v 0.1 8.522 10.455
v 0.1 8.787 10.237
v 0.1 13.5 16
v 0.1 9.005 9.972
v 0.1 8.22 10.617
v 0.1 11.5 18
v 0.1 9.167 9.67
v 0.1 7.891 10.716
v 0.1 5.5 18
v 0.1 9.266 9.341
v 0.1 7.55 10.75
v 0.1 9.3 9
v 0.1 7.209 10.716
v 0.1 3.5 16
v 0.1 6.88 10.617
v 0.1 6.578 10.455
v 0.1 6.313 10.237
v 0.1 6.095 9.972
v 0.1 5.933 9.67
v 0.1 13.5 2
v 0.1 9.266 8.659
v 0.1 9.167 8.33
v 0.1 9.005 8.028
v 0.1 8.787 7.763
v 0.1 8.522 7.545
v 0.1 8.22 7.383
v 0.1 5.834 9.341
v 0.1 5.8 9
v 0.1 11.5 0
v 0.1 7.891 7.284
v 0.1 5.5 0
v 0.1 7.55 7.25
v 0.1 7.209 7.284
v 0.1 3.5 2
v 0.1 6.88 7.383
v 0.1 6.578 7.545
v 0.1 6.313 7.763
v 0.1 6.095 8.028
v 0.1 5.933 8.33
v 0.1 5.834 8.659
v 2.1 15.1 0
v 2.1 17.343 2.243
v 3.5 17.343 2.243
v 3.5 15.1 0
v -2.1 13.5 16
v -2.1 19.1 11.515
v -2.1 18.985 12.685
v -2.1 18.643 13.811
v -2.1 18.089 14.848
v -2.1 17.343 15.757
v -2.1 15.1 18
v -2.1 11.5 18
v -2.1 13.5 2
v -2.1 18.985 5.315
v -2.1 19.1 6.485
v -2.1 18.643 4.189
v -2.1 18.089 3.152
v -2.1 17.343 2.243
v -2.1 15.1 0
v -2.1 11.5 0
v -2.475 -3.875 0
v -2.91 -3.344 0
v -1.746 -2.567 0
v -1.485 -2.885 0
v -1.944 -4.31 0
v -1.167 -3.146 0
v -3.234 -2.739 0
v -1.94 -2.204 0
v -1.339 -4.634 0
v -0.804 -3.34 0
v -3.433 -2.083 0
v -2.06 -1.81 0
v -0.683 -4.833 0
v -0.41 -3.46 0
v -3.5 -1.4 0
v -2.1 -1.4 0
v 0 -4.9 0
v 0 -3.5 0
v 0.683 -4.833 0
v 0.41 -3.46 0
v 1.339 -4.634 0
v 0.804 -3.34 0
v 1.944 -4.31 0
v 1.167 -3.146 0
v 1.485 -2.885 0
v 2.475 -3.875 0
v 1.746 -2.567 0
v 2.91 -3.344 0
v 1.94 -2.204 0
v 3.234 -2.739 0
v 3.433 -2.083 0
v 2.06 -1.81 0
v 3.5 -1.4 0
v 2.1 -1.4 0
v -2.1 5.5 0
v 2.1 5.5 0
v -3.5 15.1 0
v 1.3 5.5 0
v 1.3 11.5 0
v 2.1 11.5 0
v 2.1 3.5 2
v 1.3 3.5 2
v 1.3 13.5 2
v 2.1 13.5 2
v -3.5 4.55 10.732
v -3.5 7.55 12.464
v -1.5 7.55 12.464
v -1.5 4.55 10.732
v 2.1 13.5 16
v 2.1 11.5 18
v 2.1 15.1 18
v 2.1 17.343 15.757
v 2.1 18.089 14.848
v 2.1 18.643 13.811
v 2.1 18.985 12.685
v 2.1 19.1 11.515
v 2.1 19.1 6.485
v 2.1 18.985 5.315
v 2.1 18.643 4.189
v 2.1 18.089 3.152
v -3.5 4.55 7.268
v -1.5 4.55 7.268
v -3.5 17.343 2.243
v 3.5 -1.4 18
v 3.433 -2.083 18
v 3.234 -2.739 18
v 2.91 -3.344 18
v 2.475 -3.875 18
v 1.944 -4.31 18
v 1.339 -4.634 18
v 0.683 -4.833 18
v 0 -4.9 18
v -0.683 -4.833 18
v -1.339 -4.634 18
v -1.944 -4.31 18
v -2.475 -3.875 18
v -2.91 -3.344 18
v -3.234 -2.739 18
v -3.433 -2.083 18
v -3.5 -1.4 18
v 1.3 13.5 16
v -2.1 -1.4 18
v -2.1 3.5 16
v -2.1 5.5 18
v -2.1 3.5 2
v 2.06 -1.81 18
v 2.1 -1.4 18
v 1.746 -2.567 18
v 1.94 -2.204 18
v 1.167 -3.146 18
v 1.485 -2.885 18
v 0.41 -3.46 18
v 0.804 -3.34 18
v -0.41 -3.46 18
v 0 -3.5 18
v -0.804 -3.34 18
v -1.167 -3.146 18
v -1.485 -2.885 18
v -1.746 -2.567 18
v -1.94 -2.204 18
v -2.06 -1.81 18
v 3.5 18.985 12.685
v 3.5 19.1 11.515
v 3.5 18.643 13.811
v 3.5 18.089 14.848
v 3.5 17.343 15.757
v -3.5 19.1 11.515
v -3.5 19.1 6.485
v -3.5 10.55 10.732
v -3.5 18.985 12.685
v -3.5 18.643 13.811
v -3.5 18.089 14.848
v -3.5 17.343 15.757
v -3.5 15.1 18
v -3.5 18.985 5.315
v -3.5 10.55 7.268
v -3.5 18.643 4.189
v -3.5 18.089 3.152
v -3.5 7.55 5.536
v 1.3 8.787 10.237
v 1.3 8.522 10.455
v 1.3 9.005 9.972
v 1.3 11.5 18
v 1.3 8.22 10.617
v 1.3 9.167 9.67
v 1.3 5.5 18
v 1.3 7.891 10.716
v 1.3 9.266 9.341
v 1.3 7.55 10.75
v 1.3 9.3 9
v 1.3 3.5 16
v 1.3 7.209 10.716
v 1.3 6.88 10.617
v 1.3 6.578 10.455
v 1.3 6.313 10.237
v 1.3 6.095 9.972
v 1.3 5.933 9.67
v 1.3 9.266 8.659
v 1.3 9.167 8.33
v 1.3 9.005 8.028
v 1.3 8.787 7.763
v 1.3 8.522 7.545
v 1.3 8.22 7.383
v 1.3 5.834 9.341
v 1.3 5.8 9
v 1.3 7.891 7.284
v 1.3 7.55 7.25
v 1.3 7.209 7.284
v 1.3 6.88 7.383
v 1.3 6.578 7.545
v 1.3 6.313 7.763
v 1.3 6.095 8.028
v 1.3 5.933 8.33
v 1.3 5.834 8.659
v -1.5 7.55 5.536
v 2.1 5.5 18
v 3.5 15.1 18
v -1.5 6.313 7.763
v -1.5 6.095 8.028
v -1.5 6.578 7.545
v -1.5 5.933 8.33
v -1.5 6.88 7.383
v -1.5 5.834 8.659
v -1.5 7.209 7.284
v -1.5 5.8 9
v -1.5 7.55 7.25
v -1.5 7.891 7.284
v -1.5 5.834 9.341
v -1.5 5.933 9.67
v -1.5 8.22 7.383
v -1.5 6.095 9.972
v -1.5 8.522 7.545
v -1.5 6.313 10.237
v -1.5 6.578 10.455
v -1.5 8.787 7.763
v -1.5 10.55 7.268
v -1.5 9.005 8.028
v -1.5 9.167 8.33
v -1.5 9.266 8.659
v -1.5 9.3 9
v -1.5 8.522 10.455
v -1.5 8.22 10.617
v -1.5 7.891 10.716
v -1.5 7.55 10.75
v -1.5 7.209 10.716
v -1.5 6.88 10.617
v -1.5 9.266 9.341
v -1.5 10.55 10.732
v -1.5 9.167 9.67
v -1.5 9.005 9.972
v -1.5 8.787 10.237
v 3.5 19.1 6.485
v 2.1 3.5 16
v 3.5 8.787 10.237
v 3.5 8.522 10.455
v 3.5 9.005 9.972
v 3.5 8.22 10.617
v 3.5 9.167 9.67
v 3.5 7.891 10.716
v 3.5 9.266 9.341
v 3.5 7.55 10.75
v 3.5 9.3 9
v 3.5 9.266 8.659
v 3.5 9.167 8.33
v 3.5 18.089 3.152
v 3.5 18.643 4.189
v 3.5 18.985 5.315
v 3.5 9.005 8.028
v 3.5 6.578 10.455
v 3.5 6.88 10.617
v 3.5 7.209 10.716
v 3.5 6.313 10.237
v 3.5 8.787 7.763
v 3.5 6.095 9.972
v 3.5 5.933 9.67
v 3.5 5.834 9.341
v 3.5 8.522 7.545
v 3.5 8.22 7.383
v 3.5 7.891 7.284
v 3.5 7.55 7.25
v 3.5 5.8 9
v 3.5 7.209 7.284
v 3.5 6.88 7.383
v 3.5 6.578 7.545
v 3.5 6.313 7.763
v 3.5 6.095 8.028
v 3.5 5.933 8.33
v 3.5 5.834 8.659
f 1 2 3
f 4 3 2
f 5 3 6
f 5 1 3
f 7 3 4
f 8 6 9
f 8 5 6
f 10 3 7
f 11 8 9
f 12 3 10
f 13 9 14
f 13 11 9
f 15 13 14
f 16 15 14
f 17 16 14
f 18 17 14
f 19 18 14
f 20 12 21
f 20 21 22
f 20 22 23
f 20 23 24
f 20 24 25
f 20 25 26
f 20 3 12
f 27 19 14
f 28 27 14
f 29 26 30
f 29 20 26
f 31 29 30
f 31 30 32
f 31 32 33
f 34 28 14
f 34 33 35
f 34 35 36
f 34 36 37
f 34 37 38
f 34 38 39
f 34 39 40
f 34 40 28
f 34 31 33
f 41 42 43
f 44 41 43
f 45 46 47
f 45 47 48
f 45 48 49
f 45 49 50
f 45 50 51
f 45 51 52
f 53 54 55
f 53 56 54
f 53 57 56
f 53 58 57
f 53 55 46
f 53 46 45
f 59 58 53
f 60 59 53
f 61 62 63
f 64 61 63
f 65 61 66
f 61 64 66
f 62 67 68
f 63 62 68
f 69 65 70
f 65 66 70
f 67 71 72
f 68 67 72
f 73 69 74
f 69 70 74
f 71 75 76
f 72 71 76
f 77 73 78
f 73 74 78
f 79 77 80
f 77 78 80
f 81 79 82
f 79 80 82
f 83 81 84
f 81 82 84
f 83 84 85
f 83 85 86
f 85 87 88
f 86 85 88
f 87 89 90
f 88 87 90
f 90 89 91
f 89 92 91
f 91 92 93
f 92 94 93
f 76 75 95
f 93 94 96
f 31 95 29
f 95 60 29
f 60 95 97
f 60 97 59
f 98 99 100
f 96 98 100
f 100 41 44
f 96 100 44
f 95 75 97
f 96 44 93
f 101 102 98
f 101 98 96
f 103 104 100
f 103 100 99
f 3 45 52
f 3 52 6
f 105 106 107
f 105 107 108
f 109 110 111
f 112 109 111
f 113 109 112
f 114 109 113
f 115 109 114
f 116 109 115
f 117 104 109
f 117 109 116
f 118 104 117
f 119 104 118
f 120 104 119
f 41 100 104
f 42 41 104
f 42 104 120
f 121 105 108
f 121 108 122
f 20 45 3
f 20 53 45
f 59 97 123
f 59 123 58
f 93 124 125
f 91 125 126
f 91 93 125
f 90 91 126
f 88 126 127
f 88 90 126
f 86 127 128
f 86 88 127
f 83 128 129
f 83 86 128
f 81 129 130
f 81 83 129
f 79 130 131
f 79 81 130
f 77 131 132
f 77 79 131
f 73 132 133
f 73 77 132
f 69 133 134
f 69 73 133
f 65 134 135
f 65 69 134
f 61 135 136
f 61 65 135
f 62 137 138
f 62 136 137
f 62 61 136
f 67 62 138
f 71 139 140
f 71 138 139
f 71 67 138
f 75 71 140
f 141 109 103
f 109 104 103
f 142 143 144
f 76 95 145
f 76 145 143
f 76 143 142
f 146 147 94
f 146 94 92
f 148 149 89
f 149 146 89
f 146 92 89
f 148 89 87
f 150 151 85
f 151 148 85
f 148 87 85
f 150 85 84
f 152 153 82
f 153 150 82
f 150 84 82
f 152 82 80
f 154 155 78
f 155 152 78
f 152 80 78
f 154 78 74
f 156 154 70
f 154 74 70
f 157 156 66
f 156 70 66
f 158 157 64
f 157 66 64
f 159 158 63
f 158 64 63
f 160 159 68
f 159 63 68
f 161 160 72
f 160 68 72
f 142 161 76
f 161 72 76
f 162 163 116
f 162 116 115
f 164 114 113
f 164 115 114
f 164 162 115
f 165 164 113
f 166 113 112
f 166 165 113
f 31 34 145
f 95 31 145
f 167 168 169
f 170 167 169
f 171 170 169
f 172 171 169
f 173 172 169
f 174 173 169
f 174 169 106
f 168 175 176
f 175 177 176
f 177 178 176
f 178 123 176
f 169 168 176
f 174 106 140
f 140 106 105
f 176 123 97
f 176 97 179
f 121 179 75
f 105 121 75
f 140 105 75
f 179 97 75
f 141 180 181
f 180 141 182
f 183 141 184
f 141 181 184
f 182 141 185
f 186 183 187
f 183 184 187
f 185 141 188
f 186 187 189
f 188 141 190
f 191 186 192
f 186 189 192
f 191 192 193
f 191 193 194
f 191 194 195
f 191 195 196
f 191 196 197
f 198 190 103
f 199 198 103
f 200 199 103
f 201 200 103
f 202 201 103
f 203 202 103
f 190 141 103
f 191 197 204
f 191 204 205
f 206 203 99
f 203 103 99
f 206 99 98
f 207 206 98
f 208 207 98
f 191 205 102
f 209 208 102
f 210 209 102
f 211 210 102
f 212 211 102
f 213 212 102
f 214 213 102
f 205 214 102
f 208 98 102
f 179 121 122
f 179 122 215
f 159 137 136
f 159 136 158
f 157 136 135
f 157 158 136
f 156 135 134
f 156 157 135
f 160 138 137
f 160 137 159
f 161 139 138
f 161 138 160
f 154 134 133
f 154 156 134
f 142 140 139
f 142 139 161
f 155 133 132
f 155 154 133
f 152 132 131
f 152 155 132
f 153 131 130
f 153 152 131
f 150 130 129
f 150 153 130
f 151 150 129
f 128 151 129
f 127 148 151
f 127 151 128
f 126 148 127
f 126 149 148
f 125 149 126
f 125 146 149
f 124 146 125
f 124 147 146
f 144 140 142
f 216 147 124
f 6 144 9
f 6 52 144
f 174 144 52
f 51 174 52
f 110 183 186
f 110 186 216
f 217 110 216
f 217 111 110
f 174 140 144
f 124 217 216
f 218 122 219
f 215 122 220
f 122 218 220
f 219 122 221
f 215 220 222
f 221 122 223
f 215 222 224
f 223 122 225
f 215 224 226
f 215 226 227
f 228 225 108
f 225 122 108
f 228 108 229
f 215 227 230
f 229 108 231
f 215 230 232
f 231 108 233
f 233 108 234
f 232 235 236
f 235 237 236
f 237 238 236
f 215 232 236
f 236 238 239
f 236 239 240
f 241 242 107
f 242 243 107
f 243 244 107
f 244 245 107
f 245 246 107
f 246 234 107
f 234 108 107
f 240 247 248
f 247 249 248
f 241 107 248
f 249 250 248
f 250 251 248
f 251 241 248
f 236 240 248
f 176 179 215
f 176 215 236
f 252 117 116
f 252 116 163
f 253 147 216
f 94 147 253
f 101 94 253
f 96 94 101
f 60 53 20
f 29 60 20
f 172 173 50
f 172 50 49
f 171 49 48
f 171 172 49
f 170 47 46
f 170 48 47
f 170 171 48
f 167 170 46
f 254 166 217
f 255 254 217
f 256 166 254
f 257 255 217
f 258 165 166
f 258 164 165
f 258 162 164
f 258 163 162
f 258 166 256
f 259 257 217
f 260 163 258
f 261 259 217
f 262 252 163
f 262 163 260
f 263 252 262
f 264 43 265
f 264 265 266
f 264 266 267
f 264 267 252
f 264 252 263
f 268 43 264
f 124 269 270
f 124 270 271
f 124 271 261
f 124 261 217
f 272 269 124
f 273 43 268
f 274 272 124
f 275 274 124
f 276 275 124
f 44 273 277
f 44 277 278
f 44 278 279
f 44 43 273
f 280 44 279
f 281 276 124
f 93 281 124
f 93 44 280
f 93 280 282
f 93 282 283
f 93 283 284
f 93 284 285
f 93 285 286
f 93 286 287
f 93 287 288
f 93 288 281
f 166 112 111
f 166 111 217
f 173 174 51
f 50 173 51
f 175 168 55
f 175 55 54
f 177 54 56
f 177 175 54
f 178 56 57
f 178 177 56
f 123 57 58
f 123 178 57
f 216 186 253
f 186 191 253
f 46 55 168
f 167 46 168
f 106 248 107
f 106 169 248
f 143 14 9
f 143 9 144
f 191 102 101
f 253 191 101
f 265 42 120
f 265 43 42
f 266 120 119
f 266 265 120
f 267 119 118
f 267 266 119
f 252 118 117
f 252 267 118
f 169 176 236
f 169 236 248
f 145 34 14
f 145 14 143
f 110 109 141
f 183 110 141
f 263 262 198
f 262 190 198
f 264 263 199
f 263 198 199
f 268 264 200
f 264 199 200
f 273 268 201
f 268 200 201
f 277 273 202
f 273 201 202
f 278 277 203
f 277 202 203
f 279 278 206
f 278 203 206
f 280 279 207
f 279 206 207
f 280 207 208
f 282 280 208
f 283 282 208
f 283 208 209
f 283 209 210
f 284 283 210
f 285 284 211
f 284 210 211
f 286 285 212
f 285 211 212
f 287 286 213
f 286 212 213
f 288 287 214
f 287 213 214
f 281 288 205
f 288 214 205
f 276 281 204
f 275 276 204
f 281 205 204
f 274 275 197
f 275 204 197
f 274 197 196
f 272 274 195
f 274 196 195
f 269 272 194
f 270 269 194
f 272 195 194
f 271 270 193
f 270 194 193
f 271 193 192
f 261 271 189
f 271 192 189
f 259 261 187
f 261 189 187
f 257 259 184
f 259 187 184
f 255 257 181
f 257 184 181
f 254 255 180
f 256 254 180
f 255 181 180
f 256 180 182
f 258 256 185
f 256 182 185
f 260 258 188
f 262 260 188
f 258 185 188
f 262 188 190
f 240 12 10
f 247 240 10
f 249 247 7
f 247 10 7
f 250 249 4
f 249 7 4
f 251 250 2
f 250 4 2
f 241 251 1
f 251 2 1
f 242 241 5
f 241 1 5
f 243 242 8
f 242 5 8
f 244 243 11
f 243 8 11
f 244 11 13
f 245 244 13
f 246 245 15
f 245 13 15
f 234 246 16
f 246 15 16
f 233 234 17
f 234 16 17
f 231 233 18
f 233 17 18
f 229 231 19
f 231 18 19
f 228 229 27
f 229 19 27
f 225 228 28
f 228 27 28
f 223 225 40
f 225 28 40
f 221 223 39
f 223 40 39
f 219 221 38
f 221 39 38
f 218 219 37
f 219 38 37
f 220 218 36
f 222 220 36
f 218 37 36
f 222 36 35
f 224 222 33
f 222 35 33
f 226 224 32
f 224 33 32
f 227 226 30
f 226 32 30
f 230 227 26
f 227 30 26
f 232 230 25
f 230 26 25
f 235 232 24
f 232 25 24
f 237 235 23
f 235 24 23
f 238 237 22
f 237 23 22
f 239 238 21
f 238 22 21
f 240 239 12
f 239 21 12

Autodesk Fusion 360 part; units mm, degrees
sketch "Sketch1" plane through (0, 0, 0) normal (0, 0, 1) x (1, 0, 0)
  line L0 (1.75, -1.4) -> (1.75, 1.4) construction
  arc A0 (1.75, 1.4) -> (-1.75, 1.4) centre (0, 1.4) ccw construction
  line L1 (-1.75, 1.4) -> (-1.75, -1.4) construction
  arc A1 (-1.75, -1.4) -> (1.75, -1.4) centre (0, -1.4) ccw construction
  line L2 (0, -1.4) -> (0, 1.4) construction
  line L3 (0, 3.15) -> (0, -3.15) construction
  line L4 (-2.1, 19.1) -> (-2.1, -1.4)
  arc A2 (-2.1, -1.4) -> (2.1, -1.4) centre (0, -1.4) ccw
  line L5 (2.1, -1.4) -> (2.1, 19.1)
  line L6 (-2.1, 19.1) -> (-3.5, 19.1)
  line L7 (-3.5, 19.1) -> (-3.5, -1.4)
  line L8 (2.1, 19.1) -> (3.5, 19.1)
  line L9 (3.5, 19.1) -> (3.5, -1.4)
  arc A3 (-3.5, -1.4) -> (3.5, -1.4) centre (0, -1.4) ccw
  line L10 (2.1, 13.5) -> (1.3, 13.5)
  line L11 (1.3, 13.5) -> (1.3, 3.5)
  line L12 (1.3, 3.5) -> (2.1, 3.5)
  line L13 (-2.1, 13.5) -> (0.1, 13.5)
  line L14 (0.1, 13.5) -> (0.1, 3.5)
  line L15 (0.1, 3.5) -> (-2.1, 3.5)
  point P0 (0, -4.9)
  dimension "d1" = 3.5
  dimension "d2" = 6.3
  dimension "d12" = 24
  dimension "d14" = 2.1
  dimension "d15" = 1.4
  dimension "d16" = 10
  dimension "d17" = 3.5
  dimension "d25" = 2.2
  dimension "d26" = 0.8
extrude "Extrude1" add sketch "Sketch1" along normal blind 18
sketch "Sketch2" plane through (0, 0, 0) normal (1, 0, 0) x (0, 1, 0)
  line L0 (19.1, 0) -> (19.1, 18)
  circle A0 centre (7.55, 9) radius 1.75
  line L1 (3.15, 0) -> (1.4, 0)
  line L2 (7.55, 9) -> (5.8, 9) construction
  line L3 (10.55, 10.7321) -> (7.55, 12.4641)
  line L4 (7.55, 12.4641) -> (4.55, 10.7321)
  line L5 (4.55, 10.7321) -> (4.55, 7.2679)
  line L6 (4.55, 7.2679) -> (7.55, 5.5359)
  line L7 (7.55, 5.5359) -> (10.55, 7.2679)
  line L8 (10.55, 7.2679) -> (10.55, 10.7321)
  point P0 (19.1, 9)
  point P1 (3.15, 0)
  point P2 (7.55, 9)
  dimension "d7" = 3.5
  dimension "d20" = 6
  dimension "d24" = 1.4
extrude "Extrude2" cut sketch "Sketch2" along normal mid plane 14 contours A0
chamfer "Chamfer1" distance 4 angle 45 4 edges at (2.8, 19.1, 0) (-2.8, 19.1, 0) (2.8, 19.1, 18) (-2.8, 19.1, 18)
fillet "Fillet1" radius 6 4 edges at (2.8, 19.1, 4) (2.8, 19.1, 14) (-2.8, 19.1, 4) (-2.8, 19.1, 14)
extrude "Extrude3" cut sketch "Sketch2" along normal blind 2 from surface at -3.5
chamfer "Chamfer2" distance 2 angle 45 8 edges at (-1, 13.5, 18) (-1, 3.5, 18) (1.7, 13.5, 18) (1.7, 3.5, 18) (1.7, 13.5, 0) (-1, 13.5, 0) (1.7, 3.5, 0) (-1, 3.5, 0)
